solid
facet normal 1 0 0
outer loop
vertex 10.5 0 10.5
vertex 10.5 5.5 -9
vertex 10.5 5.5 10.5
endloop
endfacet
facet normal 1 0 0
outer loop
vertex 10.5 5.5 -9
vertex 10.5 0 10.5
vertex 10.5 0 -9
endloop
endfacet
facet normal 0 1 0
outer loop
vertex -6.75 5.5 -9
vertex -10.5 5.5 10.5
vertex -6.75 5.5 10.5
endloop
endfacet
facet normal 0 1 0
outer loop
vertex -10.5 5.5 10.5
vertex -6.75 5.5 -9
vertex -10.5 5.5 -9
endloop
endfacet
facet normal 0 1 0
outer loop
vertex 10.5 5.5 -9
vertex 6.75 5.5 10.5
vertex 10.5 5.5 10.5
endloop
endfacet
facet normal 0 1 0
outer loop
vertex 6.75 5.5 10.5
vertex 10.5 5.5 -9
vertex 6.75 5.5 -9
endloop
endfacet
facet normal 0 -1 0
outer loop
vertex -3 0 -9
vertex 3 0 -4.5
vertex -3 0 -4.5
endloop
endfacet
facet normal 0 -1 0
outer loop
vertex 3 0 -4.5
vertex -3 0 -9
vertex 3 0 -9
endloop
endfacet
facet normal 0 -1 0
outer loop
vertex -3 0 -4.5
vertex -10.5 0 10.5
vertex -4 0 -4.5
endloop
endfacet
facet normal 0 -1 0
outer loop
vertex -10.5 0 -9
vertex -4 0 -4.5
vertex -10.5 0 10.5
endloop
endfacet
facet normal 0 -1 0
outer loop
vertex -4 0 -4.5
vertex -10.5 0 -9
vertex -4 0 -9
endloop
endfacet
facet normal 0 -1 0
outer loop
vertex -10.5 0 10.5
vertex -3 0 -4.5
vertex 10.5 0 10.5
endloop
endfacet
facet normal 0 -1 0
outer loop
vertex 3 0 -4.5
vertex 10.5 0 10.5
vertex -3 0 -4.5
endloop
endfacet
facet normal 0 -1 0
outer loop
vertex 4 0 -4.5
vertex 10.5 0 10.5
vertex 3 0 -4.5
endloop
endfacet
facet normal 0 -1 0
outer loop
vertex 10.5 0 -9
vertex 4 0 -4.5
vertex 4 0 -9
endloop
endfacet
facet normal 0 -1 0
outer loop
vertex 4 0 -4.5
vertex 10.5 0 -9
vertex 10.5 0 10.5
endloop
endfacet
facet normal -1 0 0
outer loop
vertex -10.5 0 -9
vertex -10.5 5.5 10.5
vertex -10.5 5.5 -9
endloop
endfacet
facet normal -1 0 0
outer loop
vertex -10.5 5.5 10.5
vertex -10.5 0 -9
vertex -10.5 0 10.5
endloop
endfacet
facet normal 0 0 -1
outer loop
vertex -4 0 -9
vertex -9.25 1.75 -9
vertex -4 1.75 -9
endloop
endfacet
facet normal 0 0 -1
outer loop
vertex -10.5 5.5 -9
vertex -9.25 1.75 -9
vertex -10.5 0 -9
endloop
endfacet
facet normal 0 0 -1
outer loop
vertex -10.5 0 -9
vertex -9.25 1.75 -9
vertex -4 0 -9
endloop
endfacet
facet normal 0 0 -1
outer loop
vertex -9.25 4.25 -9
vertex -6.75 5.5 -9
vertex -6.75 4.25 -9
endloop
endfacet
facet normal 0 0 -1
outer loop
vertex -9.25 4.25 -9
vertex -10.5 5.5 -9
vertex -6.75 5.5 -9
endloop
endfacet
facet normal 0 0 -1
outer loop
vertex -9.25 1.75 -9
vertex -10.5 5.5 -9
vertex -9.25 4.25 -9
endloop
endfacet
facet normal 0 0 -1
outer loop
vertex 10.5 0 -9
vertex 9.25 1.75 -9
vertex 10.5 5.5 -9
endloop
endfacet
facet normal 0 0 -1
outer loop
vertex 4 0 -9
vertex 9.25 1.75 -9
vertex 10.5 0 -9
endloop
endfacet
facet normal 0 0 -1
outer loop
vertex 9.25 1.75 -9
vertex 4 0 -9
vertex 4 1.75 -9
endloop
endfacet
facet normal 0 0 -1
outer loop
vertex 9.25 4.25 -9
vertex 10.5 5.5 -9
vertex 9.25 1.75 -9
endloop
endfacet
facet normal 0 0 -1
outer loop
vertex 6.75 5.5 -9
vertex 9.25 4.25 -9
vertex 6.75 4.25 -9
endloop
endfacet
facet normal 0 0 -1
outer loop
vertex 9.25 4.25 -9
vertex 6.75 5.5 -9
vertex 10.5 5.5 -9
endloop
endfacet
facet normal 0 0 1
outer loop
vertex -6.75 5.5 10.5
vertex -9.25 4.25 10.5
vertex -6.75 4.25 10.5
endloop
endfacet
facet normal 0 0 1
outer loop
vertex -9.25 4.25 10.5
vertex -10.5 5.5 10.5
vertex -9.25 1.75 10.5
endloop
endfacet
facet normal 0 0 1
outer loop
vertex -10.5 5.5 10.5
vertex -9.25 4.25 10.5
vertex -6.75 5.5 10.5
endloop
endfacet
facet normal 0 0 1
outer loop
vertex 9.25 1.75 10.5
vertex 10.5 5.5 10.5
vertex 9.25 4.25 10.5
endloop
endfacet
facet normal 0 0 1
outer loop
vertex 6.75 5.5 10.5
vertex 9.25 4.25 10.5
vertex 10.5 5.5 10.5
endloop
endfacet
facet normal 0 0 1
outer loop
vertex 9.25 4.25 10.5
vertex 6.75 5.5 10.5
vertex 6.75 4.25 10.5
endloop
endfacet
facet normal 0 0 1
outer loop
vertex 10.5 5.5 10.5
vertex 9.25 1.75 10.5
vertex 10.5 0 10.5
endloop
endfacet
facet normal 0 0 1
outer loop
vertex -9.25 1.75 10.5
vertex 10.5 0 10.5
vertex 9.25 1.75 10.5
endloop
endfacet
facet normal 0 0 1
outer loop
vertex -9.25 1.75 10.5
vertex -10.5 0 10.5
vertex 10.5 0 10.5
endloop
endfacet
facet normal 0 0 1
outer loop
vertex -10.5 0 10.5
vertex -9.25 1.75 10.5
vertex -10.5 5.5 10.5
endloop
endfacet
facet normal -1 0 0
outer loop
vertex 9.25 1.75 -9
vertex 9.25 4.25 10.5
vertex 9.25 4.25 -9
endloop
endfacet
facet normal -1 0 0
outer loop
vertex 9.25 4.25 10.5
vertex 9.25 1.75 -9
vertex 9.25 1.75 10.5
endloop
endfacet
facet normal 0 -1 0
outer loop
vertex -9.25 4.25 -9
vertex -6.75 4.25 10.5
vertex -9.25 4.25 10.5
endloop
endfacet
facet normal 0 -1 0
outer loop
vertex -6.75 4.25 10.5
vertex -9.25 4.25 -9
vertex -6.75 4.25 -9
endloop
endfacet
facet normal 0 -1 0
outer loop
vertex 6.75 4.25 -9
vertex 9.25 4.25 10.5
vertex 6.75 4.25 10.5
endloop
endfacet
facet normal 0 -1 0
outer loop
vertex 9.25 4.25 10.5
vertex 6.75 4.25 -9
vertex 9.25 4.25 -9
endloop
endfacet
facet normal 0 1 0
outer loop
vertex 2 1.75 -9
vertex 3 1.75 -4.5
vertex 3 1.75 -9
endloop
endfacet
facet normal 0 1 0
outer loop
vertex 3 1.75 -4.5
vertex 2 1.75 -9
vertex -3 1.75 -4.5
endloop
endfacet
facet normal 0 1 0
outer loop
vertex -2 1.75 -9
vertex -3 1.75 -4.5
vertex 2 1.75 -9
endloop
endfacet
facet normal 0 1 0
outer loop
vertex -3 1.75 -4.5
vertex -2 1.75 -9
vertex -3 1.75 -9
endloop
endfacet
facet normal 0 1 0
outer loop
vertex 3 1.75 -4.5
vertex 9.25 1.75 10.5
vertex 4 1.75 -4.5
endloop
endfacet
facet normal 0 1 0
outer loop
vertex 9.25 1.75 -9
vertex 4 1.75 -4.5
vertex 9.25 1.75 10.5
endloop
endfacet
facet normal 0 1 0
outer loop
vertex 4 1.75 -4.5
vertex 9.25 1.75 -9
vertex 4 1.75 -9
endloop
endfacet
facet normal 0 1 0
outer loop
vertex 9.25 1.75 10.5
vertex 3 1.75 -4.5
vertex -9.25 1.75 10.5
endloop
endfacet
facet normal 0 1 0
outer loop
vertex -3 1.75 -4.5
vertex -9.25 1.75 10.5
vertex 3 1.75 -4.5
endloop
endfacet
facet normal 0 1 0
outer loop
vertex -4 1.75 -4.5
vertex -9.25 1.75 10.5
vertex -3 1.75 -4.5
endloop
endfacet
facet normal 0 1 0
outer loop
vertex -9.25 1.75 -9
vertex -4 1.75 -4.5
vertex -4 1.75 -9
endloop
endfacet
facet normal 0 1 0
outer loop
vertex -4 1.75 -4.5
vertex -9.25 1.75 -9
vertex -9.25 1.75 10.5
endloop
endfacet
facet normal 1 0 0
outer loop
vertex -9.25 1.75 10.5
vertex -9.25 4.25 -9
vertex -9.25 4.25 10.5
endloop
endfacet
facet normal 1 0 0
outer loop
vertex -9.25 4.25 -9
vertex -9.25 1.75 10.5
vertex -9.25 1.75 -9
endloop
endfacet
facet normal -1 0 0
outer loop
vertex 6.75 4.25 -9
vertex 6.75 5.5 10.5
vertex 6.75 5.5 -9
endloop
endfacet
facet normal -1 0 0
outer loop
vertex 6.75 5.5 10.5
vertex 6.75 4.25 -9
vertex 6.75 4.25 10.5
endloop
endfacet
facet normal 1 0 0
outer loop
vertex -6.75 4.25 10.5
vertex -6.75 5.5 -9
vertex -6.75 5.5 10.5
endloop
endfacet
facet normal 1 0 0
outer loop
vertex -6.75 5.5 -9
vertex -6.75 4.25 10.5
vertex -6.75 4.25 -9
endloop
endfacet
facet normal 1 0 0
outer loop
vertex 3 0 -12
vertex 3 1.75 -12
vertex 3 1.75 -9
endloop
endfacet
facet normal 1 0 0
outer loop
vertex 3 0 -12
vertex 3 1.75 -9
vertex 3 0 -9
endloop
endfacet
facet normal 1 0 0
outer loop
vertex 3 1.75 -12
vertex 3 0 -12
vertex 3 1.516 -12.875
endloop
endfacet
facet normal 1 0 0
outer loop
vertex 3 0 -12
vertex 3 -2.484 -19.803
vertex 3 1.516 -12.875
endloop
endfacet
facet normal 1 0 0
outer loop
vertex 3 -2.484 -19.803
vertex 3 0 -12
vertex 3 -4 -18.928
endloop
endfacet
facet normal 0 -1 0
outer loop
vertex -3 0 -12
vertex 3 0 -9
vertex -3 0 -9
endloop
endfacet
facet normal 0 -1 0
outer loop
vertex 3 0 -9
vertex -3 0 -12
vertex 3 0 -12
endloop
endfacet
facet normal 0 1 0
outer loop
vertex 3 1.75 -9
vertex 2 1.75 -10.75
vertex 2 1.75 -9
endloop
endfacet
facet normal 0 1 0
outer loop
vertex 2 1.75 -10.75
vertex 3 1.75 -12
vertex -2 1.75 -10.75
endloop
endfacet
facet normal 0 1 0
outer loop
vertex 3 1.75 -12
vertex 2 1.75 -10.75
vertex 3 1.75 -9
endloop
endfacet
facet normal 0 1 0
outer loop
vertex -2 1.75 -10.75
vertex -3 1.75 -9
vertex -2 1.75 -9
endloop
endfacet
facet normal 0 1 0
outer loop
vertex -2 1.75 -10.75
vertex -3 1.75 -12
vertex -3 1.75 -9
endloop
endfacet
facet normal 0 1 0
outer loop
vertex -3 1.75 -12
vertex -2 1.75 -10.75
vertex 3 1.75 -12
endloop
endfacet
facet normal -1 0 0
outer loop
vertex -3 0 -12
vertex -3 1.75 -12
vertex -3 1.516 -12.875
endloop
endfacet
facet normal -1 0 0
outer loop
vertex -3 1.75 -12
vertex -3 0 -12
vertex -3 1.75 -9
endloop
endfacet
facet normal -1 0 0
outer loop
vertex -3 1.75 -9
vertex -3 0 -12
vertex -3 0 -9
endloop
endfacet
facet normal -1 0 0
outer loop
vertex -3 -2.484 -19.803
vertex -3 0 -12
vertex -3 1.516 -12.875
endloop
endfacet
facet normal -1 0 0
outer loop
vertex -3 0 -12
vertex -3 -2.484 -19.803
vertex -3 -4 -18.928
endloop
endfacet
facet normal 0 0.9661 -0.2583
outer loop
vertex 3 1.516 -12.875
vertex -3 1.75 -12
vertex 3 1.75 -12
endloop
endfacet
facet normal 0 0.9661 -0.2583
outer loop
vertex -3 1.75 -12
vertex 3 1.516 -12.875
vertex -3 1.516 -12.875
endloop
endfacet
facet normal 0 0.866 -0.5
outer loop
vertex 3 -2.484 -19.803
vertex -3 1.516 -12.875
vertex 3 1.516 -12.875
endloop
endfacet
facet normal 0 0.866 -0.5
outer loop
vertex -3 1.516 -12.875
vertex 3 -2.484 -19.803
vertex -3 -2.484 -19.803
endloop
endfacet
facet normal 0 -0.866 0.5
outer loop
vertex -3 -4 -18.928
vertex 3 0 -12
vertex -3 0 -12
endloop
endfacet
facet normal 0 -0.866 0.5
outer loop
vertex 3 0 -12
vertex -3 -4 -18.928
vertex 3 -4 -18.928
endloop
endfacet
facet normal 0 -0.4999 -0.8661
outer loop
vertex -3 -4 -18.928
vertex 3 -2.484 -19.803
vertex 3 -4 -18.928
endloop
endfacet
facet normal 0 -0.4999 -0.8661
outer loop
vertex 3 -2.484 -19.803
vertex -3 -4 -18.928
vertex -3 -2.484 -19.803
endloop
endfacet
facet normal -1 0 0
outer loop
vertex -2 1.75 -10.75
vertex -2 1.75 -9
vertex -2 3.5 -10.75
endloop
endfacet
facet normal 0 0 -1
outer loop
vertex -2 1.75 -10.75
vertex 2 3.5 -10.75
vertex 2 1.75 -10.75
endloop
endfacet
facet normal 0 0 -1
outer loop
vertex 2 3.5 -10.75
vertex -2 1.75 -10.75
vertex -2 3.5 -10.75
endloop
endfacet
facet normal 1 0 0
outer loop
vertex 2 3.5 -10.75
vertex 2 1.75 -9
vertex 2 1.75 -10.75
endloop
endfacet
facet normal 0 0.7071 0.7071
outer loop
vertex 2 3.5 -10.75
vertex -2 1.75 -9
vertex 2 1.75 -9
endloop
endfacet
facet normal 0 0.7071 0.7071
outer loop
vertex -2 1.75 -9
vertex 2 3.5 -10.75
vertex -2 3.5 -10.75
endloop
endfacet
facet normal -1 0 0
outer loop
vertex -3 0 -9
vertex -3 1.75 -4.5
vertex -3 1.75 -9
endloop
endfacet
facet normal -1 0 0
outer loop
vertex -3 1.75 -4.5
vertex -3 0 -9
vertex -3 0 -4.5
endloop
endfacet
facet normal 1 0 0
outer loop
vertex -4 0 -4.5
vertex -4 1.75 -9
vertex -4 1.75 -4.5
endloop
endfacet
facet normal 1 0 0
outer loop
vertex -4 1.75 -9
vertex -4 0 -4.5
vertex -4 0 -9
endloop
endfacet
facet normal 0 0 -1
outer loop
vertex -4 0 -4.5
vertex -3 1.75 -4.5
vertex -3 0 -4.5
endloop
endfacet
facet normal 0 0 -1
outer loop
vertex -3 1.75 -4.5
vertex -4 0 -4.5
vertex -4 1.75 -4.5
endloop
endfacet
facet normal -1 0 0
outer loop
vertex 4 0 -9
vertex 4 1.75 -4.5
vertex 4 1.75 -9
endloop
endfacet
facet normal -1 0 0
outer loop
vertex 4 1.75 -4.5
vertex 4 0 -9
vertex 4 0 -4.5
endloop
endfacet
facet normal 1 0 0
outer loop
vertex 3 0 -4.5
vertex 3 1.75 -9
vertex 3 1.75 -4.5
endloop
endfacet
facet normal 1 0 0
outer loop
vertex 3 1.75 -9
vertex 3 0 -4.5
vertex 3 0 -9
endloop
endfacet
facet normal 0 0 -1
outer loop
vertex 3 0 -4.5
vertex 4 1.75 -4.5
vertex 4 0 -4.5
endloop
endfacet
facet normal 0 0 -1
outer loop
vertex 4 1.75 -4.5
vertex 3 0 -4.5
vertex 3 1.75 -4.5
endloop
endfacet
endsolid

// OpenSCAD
// mounting bracket for axiom pulse 60
ax_body_height = 19.5;
ax_body_width = 21;
// this should really be 5.0, but my printer, the form 1, prints the back and rail too thick
ax_body_depth = 5.5;

ax_back_thickness = 1.75;
ax_side_thickness = 1.25;
ax_rail_thickness = 1.25;
ax_rail_width = 3.75;

ax_latch_length = 1.75;
ax_latch_width = 4.0;
// stock is 1.25, bumped up by .5 to more securely retain
ax_latch_height = 1.75;

ax_release_cutout_width = 1.0;
ax_release_cutout_length = 4.5;
ax_release_angle = 30;
ax_release_width = 6.0;
ax_release_flat_length = 3.0;
ax_release_angled_length = 8.0;

module ax_body() {
    difference() {
        cube([ax_body_width, ax_body_height, ax_body_depth]);
        translate([ax_side_thickness, 0, ax_back_thickness])
            cube([ax_body_width - 2 * ax_side_thickness, ax_body_height, ax_body_depth - ax_back_thickness - ax_rail_thickness]);
        translate([ax_rail_width, 0, ax_body_depth - ax_rail_thickness])
            cube([ax_body_width - 2 * ax_rail_width, ax_body_height, ax_rail_thickness]);
    }
}

module ax_release() {
    union() {
        hull() {
            translate([(ax_body_width - ax_release_width) / 2, ax_body_height, 0])
            cube([ax_release_width, ax_release_flat_length, ax_back_thickness]);

            // Use hull() with a short length version of the angled part to fill in the gap
            translate([(ax_body_width - ax_release_width) / 2, ax_body_height + ax_release_flat_length, 0])
            rotate([-ax_release_angle, 0, 0])
            cube([ax_release_width, 0.0001, ax_back_thickness]);
        }

        translate([(ax_body_width - ax_release_width) / 2, ax_body_height + ax_release_flat_length, 0])
        rotate([-ax_release_angle, 0, 0])
        cube([ax_release_width, ax_release_angled_length, ax_back_thickness]);
    }
}

module ax_release_cutout() {
    union() {
        translate([(ax_body_width - ax_release_width) / 2 - ax_release_cutout_width, ax_body_height - ax_release_cutout_length, 0])
        cube([ax_release_cutout_width, ax_release_cutout_length, ax_back_thickness]);

        translate([(ax_body_width + ax_release_width) / 2, ax_body_height - ax_release_cutout_length, 0])
        cube([ax_release_cutout_width, ax_release_cutout_length, ax_back_thickness]);
    }
}

module ax_latch() {
    translate([(ax_body_width - ax_latch_width) / 2, ax_body_height, ax_back_thickness])
    rotate([90,0,90])
    linear_extrude(ax_latch_width) {
        polygon([
            [0, 0],
            [ax_latch_length, ax_latch_height],
            [ax_latch_length, 0]
        ]);
    }
}

module axiom_bracket() {
    translate([-ax_body_width / 2, 0, ax_body_width / 2])
    rotate([-90, 0, 0])
    union() {
        difference() {
            union() {
                ax_body();
                ax_release();
                ax_latch();
            }
            ax_release_cutout();
        }
        ax_latch();
    }
}

axiom_bracket();
